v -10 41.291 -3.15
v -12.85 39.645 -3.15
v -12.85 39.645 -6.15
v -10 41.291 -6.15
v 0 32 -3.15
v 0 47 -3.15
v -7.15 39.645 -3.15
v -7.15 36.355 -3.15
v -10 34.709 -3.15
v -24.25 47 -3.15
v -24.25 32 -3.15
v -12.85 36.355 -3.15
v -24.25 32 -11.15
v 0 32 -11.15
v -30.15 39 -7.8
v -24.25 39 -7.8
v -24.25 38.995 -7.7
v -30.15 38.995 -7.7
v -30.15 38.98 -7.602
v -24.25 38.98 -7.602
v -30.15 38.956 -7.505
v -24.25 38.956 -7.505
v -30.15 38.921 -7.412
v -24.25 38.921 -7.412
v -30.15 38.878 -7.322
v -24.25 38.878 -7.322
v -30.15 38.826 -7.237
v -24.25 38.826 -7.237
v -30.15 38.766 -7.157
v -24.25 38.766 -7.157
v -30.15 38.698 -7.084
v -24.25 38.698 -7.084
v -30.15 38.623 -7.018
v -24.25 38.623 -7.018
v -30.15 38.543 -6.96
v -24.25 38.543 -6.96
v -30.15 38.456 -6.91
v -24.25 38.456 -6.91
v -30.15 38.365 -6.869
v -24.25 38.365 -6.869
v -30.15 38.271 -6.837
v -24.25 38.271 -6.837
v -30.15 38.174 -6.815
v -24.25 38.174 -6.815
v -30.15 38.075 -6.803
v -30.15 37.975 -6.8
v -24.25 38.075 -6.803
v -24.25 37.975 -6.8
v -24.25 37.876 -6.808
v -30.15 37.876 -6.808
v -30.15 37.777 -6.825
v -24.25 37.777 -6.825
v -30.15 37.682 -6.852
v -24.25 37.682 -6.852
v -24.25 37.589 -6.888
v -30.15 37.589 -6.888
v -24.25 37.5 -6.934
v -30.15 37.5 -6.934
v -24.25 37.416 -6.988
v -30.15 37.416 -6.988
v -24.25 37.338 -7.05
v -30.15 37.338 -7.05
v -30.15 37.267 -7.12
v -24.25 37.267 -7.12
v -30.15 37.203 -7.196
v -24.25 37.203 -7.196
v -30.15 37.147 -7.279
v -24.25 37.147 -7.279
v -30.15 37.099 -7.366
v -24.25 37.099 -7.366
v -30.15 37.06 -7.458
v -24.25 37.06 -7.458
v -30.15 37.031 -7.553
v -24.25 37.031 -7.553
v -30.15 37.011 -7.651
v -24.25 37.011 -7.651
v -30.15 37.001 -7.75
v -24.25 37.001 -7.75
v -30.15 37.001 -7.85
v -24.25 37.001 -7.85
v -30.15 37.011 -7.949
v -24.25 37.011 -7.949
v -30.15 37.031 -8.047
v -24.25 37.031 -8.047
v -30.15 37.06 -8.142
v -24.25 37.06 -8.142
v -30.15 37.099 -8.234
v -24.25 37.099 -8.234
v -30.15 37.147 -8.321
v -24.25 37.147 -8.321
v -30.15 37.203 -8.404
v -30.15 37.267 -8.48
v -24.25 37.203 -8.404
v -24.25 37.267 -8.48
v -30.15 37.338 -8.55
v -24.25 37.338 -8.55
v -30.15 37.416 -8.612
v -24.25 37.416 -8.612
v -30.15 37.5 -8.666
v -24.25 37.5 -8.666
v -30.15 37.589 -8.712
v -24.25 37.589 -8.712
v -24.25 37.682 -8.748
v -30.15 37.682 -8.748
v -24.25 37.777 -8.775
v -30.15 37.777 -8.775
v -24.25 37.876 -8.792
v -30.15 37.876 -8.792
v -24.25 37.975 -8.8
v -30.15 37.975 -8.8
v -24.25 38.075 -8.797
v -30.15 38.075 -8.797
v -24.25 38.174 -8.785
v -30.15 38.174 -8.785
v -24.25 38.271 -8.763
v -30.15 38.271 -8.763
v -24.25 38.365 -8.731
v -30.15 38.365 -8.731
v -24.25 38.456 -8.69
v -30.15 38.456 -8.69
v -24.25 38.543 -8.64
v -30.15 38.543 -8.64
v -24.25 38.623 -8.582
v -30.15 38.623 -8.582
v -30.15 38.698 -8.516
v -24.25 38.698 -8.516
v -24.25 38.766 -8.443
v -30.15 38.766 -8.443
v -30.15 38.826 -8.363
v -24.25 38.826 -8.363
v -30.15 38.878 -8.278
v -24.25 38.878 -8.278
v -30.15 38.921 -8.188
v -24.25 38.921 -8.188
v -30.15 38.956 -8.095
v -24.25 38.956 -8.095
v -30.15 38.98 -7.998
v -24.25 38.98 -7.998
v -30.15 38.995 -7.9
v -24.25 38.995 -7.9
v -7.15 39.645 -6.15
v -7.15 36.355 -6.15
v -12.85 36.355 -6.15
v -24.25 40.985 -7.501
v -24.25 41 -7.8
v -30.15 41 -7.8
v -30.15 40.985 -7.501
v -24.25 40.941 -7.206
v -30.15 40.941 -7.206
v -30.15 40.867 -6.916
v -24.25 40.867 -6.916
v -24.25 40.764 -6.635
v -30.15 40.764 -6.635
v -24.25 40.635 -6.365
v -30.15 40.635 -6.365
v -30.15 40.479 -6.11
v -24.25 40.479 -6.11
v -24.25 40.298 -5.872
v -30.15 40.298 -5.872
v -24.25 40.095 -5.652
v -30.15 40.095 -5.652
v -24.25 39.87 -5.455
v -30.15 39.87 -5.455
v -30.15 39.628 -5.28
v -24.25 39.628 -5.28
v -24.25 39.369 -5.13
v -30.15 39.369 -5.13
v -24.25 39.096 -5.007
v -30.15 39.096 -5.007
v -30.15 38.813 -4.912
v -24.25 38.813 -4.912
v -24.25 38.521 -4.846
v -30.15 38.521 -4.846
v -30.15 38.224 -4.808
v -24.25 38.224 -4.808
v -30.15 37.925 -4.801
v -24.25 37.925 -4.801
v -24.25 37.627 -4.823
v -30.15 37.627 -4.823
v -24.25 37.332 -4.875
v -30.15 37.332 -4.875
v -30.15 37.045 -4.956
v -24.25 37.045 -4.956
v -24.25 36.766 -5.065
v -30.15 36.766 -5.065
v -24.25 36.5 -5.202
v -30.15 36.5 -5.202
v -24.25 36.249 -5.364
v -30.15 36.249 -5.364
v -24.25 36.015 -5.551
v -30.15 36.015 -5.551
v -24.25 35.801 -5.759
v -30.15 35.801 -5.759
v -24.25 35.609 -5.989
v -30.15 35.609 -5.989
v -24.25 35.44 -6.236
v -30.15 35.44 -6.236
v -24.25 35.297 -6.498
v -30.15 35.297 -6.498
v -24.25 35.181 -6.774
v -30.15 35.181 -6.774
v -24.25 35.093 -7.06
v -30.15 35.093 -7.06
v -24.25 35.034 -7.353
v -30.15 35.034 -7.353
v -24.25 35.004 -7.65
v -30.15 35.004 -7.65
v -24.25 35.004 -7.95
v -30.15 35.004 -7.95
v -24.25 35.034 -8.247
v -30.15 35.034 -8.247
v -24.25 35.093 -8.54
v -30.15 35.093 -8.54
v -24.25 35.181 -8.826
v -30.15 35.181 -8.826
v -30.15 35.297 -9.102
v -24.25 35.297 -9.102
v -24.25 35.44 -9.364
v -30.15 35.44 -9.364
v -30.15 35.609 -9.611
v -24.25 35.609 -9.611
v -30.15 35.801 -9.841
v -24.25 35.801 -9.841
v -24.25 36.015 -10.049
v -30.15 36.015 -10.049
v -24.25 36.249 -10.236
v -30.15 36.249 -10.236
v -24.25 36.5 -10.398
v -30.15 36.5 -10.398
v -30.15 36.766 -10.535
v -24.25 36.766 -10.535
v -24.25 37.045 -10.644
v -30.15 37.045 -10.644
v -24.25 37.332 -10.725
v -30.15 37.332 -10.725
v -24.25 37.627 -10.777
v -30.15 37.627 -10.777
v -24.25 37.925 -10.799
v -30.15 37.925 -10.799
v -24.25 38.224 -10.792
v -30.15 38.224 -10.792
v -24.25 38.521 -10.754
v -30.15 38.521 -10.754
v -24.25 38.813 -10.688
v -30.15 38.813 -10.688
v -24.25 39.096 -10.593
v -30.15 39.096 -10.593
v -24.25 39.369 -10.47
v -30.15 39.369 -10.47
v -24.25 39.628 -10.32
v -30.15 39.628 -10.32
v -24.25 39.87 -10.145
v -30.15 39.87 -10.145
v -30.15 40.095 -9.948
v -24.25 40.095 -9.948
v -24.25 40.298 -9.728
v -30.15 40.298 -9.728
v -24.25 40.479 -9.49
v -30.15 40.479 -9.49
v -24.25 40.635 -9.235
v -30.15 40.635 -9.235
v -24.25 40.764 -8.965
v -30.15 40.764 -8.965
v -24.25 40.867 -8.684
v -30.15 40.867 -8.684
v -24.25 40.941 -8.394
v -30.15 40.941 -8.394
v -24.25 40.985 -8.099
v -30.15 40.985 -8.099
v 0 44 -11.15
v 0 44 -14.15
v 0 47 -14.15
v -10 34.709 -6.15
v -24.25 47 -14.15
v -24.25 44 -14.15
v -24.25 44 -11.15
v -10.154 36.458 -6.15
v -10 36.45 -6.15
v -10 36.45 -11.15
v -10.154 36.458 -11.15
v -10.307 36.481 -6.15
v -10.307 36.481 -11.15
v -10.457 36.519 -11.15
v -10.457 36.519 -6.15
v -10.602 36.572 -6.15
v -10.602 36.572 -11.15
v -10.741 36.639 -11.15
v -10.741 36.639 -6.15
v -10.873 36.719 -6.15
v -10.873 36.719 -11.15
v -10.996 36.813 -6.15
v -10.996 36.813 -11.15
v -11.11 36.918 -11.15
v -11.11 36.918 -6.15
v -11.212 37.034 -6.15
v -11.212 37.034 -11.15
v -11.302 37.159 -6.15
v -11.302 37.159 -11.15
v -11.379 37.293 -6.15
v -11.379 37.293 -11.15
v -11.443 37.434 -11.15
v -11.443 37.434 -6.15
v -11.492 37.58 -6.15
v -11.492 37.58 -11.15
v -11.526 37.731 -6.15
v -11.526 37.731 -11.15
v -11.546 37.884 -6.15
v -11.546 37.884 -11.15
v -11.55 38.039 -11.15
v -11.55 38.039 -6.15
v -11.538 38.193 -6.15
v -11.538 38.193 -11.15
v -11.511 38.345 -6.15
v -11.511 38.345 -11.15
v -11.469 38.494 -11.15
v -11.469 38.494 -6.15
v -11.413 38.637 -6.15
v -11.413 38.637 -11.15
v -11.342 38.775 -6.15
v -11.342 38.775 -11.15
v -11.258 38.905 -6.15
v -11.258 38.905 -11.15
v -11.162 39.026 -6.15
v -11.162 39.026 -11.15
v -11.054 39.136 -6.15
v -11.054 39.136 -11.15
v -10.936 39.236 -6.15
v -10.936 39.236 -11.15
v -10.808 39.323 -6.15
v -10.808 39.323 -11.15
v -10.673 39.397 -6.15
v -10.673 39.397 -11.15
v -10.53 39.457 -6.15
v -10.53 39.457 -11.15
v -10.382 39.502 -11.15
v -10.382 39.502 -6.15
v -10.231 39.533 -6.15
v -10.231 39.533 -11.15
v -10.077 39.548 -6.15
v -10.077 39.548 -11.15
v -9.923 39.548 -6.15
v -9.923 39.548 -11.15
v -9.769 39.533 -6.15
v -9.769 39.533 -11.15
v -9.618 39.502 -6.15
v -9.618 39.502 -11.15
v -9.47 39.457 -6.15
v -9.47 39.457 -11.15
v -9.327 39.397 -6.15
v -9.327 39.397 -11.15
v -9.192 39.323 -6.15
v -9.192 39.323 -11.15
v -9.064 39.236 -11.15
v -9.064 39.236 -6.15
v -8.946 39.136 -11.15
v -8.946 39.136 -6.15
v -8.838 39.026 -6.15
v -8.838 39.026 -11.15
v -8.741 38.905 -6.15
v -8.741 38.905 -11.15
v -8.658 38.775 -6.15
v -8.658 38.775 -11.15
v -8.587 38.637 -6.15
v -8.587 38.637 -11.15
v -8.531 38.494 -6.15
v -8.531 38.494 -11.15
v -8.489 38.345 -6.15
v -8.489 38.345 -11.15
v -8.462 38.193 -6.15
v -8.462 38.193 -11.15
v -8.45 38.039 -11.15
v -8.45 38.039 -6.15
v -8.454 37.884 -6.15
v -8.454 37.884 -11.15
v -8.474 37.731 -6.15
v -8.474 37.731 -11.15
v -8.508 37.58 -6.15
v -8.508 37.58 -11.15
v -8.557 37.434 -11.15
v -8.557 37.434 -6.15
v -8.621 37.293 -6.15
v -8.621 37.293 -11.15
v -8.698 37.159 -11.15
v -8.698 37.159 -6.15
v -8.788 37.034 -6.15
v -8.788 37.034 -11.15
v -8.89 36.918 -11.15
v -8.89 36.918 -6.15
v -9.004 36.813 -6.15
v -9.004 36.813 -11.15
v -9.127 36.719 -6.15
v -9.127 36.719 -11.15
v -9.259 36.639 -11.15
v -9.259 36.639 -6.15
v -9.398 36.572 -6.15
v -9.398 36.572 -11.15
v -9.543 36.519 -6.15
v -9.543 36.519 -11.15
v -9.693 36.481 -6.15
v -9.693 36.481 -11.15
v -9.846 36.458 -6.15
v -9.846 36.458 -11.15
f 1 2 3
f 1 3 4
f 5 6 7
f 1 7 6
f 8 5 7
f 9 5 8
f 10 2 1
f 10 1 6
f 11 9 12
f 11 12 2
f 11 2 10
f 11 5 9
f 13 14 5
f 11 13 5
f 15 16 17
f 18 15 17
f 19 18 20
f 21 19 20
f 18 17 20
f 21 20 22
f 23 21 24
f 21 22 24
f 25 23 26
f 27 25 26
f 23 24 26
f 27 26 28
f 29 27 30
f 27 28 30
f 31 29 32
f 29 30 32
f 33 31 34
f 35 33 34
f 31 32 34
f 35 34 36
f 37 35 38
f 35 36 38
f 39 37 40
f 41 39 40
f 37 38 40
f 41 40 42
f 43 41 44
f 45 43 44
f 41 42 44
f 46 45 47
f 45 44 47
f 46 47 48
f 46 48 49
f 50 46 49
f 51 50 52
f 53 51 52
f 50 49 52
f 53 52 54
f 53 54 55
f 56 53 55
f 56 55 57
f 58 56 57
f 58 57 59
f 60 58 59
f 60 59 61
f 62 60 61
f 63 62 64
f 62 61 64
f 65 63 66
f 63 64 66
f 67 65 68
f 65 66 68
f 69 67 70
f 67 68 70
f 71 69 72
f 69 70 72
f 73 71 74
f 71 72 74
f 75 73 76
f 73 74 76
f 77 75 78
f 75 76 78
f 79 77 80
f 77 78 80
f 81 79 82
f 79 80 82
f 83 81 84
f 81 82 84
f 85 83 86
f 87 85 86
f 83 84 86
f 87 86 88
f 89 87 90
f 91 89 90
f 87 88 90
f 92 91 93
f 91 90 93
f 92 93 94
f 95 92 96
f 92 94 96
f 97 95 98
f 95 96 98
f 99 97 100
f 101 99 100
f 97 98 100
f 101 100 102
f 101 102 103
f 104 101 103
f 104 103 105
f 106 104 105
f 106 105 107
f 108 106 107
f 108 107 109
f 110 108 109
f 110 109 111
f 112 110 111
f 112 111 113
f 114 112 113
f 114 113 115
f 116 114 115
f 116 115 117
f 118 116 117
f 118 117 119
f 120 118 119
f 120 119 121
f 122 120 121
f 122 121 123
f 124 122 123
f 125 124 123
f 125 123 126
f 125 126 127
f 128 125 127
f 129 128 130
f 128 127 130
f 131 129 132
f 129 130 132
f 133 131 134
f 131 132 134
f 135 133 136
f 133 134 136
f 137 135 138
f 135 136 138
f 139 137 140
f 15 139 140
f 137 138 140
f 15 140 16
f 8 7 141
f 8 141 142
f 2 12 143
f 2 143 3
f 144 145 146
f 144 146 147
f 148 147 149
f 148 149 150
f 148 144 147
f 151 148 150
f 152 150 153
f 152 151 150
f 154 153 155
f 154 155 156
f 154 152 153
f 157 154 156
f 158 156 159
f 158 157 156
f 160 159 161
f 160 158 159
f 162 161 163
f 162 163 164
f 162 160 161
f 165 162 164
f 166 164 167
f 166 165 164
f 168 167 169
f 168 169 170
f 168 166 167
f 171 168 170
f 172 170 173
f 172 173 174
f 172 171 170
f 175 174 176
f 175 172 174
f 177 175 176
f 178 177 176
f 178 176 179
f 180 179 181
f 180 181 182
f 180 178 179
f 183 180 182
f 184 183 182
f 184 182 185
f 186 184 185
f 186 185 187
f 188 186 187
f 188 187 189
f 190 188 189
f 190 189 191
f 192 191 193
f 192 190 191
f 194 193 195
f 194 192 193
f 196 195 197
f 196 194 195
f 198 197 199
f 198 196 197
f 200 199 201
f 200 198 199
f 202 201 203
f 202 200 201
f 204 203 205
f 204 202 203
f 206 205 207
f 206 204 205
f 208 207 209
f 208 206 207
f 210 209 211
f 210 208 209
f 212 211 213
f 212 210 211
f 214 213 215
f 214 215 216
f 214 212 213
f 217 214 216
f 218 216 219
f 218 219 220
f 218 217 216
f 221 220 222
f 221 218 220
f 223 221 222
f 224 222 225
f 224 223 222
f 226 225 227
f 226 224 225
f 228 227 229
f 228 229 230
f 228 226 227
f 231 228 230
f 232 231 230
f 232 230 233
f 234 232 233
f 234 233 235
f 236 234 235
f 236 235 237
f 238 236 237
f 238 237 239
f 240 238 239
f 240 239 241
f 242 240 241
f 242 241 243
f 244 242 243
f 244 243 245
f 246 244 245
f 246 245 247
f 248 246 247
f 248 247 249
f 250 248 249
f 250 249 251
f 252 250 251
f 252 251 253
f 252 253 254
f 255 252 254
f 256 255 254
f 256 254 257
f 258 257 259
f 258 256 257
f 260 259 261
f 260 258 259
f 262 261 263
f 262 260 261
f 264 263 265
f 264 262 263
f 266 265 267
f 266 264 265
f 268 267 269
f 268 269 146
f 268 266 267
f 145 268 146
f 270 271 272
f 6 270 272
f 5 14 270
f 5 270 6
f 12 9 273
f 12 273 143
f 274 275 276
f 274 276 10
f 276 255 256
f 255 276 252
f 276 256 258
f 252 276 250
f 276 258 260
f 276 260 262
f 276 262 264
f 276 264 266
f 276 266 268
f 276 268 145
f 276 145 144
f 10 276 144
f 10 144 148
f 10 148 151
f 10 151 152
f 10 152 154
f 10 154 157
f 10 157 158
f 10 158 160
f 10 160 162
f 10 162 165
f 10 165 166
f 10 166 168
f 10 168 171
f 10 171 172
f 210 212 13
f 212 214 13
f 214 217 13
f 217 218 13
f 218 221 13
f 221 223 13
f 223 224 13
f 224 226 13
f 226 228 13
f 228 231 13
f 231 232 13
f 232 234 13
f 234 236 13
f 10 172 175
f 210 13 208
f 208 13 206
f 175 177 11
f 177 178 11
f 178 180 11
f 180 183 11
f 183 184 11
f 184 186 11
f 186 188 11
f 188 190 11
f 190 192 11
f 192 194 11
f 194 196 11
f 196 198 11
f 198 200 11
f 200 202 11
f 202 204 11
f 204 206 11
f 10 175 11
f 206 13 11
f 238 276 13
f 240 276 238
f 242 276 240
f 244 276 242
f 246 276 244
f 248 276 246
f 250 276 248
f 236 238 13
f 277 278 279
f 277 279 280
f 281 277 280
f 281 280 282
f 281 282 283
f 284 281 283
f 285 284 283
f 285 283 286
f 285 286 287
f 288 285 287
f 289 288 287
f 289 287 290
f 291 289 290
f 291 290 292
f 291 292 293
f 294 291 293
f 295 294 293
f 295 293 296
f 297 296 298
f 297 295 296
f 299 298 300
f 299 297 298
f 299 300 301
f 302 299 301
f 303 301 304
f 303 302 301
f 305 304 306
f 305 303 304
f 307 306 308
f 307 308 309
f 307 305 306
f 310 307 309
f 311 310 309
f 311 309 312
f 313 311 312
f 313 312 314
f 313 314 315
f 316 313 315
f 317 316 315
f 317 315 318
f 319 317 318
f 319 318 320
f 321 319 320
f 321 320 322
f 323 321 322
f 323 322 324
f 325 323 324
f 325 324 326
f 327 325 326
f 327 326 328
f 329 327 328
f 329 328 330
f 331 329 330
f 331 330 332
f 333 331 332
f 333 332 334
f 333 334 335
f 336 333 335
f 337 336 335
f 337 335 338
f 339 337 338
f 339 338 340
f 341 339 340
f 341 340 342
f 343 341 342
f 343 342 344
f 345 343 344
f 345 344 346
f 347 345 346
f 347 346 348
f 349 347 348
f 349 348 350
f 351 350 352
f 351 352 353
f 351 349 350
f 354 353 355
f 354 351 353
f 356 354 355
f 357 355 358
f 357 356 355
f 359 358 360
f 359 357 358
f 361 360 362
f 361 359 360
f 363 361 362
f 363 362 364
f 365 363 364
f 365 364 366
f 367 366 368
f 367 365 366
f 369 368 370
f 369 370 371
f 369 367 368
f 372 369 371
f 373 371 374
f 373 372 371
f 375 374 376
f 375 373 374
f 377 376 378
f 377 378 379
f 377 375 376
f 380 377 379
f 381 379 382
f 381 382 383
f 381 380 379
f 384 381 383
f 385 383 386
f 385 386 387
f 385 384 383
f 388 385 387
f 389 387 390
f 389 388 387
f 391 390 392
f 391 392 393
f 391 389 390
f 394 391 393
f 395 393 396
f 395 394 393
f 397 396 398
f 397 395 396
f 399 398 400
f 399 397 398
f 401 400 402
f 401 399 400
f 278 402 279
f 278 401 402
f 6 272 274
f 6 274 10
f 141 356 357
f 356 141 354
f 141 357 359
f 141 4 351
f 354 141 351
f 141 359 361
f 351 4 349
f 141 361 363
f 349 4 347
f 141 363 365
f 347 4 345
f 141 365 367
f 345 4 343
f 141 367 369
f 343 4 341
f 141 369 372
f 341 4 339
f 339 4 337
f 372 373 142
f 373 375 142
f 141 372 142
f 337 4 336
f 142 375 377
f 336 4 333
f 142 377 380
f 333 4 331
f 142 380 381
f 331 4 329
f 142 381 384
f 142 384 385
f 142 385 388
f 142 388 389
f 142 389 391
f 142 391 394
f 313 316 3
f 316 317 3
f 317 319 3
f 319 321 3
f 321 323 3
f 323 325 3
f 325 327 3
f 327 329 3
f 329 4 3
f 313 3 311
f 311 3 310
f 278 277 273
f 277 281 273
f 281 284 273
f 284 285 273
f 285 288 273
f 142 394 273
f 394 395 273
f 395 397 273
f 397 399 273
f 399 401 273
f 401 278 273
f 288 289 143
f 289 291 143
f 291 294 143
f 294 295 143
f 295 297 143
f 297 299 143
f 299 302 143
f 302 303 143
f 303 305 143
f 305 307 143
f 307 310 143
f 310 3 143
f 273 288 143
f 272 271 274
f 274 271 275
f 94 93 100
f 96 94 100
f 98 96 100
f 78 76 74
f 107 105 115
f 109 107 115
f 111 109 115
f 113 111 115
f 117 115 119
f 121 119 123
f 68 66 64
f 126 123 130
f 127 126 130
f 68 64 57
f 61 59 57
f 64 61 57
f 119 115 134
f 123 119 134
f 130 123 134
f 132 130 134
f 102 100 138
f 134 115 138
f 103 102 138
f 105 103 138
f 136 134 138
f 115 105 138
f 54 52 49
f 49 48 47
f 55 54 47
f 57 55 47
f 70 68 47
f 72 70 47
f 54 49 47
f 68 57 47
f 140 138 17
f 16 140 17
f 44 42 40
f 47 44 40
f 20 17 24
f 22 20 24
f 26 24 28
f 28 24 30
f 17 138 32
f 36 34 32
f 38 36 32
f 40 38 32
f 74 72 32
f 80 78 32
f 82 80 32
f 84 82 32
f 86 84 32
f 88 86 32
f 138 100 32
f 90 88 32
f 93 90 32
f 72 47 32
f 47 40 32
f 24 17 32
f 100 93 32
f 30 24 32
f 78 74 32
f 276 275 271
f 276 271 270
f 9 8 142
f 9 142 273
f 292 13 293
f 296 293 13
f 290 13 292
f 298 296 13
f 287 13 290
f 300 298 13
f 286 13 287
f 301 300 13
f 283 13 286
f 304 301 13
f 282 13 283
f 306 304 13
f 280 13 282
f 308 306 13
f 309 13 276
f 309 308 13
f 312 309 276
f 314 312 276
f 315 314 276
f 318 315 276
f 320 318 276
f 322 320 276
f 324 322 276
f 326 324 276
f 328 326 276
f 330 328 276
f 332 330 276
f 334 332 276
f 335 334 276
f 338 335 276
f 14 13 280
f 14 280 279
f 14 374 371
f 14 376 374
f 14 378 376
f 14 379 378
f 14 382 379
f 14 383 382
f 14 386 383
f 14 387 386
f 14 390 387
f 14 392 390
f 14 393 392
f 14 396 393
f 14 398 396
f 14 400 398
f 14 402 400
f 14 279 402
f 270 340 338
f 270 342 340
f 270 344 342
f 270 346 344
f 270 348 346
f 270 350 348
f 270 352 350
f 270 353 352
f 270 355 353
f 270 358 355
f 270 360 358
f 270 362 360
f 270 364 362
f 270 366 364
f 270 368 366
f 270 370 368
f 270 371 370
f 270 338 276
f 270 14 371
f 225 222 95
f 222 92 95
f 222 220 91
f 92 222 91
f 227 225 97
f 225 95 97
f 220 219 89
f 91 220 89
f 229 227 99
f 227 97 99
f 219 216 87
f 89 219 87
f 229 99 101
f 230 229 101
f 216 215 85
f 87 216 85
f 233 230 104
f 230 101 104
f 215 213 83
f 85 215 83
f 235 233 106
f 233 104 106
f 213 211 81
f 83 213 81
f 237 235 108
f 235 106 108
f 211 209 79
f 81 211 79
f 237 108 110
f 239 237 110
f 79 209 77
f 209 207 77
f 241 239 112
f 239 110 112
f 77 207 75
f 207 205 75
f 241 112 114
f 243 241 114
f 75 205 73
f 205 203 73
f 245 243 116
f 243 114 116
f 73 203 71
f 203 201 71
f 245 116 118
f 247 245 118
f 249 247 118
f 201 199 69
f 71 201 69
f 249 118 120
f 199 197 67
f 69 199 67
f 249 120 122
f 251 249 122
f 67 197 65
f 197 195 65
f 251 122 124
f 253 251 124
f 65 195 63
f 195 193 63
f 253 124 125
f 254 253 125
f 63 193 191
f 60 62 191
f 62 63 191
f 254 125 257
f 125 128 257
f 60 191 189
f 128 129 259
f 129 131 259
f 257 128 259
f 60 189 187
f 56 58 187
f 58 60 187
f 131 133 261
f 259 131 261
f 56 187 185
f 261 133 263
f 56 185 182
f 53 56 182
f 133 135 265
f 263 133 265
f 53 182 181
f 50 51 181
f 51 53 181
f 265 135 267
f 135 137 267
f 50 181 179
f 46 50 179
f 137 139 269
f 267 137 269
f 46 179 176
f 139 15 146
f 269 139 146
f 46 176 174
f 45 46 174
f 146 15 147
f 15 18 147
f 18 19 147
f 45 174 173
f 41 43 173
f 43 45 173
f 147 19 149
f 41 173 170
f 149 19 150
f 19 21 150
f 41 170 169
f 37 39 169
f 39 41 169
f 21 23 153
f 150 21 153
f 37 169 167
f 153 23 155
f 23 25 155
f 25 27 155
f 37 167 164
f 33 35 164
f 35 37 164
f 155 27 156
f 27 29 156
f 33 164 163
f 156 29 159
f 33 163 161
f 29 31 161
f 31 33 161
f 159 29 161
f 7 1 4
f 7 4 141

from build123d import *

# Parameters (mm, degrees)
SKETCH068_W     = 12
SKETCH068_H     = 8
PAD060_DEPTH    = 24.25
SKETCH069_R     = 3
SKETCH069_R_2   = 1
PAD061_DEPTH    = 5.9
SKETCH071_R     = 1.55
POCKET_DEPTH    = 8.001
POCKET001_DEPTH = 3
SKETCH072_W     = 11
SKETCH072_H     = 24.25
PAD062_DEPTH    = 3


with BuildPart() as front_axle_right:
    # Sketch068 → Pad060 (new body)
    with BuildSketch(Plane.YZ):
        with Locations((38, -7.15)):
            Rectangle(SKETCH068_W, SKETCH068_H)
    extrude(amount=PAD060_DEPTH)

    # Sketch069 (on Face6 of Pad060) → Pad061 (join)
    with BuildSketch(Plane.YZ.offset(24.25)):
        with Locations((38, -7.8)):
            Circle(SKETCH069_R)
        with Locations((38, -7.8)):
            Circle(SKETCH069_R_2, mode=Mode.SUBTRACT)
    extrude(amount=PAD061_DEPTH)

    # Sketch071 (on Face1 of Pad061) → Pocket (cut, through all)
    with BuildSketch(Plane(origin=(0, 0, -3.15), x_dir=(0, -1, 0), z_dir=(0, 0, 1))):
        with Locations((-38, 10)):
            Circle(SKETCH071_R)
    extrude(amount=-POCKET_DEPTH, mode=Mode.SUBTRACT)

    # Sketch070 (on Face1 of Pocket) → Pocket001 (cut)
    with BuildSketch(Plane(origin=(0, 0, -3.15), x_dir=(0, -1, 0), z_dir=(0, 0, 1))):
        Polygon((-34.709103, 10), (-36.354552, 12.85), (-39.645448, 12.85), (-41.290897, 10), (-39.645448, 7.15), (-36.354552, 7.15), align=None)
    extrude(amount=-POCKET001_DEPTH, mode=Mode.SUBTRACT)

    # Sketch072 (on Face5 of Pocket001) → Pad062 (join)
    with BuildSketch(Plane.ZX.offset(44)):
        with Locations((-8.65, 12.125)):
            Rectangle(SKETCH072_W, SKETCH072_H)
    extrude(amount=PAD062_DEPTH)


with BuildPart() as front_axle_right_mirrored:
    # Mirror: instance of front_axle_right
    add(front_axle_right.part.mirror(Plane(origin=(3e-06, 39.5, -8.649999), x_dir=(0, -1, 0), z_dir=(1, 0, 0))))


solid = front_axle_right_mirrored.part
